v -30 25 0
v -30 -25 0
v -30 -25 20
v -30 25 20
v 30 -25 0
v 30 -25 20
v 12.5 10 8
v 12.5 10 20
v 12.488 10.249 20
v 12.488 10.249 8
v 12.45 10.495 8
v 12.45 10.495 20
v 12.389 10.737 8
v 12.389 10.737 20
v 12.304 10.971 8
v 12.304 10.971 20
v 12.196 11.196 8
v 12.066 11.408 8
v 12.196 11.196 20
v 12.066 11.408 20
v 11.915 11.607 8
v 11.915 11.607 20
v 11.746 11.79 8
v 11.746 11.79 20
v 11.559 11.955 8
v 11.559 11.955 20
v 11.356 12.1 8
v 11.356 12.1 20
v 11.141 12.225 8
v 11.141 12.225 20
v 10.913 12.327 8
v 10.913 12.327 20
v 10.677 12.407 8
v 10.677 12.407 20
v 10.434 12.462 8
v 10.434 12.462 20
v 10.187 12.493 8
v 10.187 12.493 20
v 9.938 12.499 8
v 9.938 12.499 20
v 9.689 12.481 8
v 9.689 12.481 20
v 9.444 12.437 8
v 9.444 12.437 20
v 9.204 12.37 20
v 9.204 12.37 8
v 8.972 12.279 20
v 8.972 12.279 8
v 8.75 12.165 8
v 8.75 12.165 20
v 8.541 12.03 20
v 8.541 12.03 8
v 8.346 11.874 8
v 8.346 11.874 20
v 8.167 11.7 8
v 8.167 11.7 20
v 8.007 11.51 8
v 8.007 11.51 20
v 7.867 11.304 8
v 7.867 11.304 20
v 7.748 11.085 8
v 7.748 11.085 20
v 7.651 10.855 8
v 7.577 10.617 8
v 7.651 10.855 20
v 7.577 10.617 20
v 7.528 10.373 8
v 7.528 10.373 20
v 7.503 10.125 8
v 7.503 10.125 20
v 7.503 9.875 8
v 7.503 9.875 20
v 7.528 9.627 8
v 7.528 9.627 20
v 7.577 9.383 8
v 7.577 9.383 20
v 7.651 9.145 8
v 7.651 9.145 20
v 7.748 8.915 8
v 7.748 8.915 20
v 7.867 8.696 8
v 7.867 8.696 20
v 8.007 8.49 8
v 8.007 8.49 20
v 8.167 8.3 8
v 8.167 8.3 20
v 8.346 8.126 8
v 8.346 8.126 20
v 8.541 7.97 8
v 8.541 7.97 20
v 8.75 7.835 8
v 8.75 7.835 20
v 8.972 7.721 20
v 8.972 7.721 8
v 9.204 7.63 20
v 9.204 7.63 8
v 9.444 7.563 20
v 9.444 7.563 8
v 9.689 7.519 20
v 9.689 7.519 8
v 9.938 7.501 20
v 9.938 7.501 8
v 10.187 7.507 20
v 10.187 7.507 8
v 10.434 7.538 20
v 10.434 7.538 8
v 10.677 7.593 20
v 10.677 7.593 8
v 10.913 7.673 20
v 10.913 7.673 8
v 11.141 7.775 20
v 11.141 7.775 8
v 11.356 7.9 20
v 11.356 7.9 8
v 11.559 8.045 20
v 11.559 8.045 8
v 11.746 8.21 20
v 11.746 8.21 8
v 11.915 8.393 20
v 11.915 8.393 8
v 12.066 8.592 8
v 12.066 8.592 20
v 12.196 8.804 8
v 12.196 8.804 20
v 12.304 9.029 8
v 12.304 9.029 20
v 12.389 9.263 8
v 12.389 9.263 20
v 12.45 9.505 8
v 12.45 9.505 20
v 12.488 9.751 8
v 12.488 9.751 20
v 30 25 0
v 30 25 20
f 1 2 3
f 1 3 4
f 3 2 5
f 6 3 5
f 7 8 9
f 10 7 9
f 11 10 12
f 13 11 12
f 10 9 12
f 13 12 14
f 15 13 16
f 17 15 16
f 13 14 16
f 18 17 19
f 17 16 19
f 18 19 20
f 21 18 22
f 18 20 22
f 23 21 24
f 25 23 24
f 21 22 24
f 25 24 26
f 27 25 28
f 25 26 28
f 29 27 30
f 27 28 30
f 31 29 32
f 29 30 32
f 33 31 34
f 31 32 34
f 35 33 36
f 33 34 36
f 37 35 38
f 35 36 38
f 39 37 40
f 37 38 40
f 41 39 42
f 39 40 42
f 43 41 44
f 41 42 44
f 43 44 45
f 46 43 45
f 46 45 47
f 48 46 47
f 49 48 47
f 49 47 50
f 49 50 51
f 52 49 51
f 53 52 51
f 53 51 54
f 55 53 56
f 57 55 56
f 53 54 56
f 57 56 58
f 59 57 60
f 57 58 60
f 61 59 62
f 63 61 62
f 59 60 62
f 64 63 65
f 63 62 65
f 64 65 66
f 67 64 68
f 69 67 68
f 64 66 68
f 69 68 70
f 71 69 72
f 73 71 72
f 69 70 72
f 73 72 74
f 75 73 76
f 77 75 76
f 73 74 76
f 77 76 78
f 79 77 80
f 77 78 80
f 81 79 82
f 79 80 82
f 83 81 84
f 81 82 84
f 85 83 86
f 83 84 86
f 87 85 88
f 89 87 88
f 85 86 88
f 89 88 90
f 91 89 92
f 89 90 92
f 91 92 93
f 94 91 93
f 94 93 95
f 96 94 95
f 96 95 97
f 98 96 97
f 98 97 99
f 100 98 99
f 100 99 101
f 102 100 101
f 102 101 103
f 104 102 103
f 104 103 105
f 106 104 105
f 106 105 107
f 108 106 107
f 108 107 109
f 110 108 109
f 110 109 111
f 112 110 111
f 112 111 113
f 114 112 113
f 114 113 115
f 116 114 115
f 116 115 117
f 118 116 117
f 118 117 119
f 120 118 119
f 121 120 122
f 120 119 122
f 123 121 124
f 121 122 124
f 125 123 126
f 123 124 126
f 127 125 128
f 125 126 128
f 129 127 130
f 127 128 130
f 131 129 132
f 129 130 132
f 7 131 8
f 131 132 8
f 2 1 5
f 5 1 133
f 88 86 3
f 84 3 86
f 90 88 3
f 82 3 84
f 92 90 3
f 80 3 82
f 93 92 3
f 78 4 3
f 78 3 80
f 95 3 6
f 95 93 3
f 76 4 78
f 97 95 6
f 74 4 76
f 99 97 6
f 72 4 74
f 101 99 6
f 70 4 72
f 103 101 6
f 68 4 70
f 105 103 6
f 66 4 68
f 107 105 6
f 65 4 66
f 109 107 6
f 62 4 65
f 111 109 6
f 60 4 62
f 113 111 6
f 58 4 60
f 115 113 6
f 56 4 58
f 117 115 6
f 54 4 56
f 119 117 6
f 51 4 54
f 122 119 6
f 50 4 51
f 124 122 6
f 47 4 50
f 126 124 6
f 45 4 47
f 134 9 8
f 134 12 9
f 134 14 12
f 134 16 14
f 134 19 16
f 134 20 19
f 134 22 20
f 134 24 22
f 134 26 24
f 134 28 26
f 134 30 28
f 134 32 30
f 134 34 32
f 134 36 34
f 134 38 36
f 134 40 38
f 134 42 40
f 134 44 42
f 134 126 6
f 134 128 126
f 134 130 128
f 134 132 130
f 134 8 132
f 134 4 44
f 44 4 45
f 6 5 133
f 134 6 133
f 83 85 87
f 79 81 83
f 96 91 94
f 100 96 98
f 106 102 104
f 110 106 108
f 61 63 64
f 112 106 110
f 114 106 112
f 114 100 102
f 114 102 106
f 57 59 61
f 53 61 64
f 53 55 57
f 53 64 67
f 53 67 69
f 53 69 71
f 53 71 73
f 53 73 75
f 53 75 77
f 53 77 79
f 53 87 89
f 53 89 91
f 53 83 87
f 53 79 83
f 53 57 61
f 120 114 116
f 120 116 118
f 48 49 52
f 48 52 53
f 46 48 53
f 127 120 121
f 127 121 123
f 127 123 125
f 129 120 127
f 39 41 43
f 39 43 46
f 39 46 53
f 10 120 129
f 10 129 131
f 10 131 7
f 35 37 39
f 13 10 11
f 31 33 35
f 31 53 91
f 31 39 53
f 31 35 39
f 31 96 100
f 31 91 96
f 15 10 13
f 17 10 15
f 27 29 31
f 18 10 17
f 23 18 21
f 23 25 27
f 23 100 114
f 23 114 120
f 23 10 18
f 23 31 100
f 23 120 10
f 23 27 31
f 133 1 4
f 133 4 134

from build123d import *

# Parameters (mm, degrees)
SKIZZE1_W                       = 60
SKIZZE1_H                       = 50
AUFSATZ_LINEAR_AUSTRAGEN1_DEPTH = 20
SKIZZE2_R                       = 2.5
SCHNITT_LINEAR_AUSTRAGEN1_DEPTH = 12


with BuildPart() as part:
    # Skizze1 → Aufsatz-Linear austragen1 (new body)
    with BuildSketch(Plane.XY):
        Rectangle(SKIZZE1_W, SKIZZE1_H)
    extrude(amount=AUFSATZ_LINEAR_AUSTRAGEN1_DEPTH)

    # Skizze2 → Schnitt-Linear austragen1 (cut)
    with BuildSketch(Plane.XY.offset(20)):
        with Locations((10, 10)):
            Circle(SKIZZE2_R)
    extrude(amount=-SCHNITT_LINEAR_AUSTRAGEN1_DEPTH, mode=Mode.SUBTRACT)


solid = part.part
